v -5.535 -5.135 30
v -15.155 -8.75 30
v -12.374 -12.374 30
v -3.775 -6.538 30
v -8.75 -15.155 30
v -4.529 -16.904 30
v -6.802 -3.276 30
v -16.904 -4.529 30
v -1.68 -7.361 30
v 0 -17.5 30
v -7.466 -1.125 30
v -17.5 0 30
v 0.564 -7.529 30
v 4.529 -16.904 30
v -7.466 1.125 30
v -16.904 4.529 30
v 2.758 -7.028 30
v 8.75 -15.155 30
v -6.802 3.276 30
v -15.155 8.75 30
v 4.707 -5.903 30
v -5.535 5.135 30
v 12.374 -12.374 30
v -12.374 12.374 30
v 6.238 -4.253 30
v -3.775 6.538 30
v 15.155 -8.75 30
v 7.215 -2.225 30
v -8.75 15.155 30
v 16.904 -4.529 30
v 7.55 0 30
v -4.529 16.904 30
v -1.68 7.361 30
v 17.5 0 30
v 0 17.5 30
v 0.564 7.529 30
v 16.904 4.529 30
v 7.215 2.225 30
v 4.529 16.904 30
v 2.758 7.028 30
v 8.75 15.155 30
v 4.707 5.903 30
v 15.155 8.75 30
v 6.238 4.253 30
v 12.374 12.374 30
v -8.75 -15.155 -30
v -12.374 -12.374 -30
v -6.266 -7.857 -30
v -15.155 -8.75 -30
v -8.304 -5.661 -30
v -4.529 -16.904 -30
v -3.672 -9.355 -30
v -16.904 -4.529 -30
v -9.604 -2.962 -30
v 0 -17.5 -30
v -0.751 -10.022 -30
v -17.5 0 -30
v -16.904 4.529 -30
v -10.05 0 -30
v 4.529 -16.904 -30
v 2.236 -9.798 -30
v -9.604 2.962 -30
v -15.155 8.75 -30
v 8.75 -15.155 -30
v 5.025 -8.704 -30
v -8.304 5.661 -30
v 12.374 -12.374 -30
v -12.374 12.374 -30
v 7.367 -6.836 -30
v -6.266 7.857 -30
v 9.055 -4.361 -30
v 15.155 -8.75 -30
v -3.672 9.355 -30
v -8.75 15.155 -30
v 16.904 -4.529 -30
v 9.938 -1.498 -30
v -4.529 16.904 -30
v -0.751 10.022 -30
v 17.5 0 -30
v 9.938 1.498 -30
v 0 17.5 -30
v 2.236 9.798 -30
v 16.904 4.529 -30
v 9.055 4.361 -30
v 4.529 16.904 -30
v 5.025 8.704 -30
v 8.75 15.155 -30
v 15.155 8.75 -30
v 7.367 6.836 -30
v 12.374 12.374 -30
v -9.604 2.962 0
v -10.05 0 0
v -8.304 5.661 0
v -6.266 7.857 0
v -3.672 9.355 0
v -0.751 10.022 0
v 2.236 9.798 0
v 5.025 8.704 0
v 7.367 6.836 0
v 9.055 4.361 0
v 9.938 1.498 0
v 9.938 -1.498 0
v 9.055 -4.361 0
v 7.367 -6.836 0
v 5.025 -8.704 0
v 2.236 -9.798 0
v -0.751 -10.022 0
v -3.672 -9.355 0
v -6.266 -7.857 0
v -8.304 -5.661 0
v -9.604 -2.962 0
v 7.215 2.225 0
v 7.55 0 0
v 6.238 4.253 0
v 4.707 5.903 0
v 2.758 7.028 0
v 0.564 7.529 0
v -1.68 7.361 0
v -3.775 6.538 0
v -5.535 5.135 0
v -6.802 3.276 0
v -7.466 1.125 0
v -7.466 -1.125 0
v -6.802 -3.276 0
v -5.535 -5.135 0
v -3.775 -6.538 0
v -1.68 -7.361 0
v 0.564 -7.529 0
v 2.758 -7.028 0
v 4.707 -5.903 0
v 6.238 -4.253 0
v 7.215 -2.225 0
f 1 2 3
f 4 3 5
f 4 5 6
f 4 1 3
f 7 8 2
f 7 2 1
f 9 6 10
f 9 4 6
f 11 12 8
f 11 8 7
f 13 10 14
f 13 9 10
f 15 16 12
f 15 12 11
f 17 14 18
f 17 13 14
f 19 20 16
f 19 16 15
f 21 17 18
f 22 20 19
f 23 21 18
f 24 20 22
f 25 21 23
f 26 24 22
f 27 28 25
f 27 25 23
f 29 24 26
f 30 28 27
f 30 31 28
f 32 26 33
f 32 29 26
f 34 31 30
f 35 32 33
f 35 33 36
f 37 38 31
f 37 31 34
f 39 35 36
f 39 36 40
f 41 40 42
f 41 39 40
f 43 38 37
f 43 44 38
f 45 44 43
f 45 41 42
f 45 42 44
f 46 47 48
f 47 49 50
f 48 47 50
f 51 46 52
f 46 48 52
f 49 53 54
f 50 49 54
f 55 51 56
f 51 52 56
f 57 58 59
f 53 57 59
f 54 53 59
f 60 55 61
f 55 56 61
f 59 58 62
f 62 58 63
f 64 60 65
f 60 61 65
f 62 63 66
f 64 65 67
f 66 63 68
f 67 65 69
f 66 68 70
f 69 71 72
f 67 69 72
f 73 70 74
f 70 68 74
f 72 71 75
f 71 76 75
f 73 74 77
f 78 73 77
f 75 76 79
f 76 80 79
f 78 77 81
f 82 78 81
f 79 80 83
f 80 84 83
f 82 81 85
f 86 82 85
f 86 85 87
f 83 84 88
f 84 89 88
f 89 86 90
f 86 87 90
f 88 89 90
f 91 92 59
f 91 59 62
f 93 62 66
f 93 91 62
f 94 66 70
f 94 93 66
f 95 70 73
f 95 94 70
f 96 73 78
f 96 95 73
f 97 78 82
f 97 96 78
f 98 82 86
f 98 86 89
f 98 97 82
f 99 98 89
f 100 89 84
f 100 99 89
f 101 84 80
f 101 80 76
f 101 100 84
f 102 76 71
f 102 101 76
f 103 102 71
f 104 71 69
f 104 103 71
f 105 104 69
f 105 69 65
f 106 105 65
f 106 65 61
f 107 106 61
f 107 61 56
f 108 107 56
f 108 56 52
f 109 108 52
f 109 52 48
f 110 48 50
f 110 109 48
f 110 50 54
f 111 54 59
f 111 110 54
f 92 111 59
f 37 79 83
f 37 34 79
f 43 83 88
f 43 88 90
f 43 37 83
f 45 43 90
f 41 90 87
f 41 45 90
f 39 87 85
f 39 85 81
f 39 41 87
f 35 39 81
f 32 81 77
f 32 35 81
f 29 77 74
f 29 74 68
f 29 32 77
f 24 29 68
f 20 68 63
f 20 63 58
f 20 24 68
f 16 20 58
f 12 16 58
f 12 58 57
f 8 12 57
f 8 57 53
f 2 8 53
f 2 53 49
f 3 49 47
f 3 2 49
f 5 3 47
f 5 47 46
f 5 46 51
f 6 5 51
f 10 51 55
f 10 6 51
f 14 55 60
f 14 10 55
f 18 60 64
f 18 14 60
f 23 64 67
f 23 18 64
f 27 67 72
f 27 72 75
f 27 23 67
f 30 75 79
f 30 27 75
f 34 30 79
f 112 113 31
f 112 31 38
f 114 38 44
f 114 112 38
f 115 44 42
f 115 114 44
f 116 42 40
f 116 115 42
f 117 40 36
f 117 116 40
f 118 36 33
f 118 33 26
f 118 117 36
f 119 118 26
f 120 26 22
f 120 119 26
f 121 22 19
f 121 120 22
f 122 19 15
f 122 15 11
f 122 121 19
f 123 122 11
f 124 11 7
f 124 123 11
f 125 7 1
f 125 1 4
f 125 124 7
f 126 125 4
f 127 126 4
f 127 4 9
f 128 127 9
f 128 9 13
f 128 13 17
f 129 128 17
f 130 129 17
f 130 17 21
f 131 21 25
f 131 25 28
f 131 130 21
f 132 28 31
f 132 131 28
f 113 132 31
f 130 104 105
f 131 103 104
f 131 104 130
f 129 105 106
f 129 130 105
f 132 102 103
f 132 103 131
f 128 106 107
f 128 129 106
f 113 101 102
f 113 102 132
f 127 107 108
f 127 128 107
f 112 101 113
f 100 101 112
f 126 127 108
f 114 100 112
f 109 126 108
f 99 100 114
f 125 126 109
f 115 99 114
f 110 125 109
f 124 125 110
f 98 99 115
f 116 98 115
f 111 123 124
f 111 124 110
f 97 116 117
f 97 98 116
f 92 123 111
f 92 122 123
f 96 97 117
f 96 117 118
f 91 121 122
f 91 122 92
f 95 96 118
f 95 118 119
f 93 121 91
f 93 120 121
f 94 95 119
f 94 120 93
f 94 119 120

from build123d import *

# Parameters (mm, degrees)
ESQUISSE1_R             = 17.5
BOSS_EXTRU_1_DEPTH      = 30
ENL_V_START             = -30
ESQUISSE2_R             = 7.55
ENL_V_MAT_EXTRU_1_DEPTH = 30
ESQUISSE3_R             = 10.05
ENL_V_MAT_EXTRU_2_DEPTH = 30


with BuildPart() as part:
    # Esquisse1 → Boss.-Extru.1 (new body, symmetric)
    with BuildSketch(Plane.XY):
        Circle(ESQUISSE1_R)
    extrude(amount=BOSS_EXTRU_1_DEPTH, both=True)

    # Esquisse2 → Enlèv. mat.-Extru.1 (cut)
    with BuildSketch(Plane.XY.offset(30).offset(ENL_V_START)):
        Circle(ESQUISSE2_R)
    extrude(amount=ENL_V_MAT_EXTRU_1_DEPTH, mode=Mode.SUBTRACT)

    # Esquisse3 → Enlèv. mat.-Extru.2 (cut)
    with BuildSketch(Plane(origin=(0, 0, -30), x_dir=(-1, 0, 0), z_dir=(0, 0, -1)).offset(ENL_V_START)):
        Circle(ESQUISSE3_R)
    extrude(amount=ENL_V_MAT_EXTRU_2_DEPTH, mode=Mode.SUBTRACT)


solid = part.part
